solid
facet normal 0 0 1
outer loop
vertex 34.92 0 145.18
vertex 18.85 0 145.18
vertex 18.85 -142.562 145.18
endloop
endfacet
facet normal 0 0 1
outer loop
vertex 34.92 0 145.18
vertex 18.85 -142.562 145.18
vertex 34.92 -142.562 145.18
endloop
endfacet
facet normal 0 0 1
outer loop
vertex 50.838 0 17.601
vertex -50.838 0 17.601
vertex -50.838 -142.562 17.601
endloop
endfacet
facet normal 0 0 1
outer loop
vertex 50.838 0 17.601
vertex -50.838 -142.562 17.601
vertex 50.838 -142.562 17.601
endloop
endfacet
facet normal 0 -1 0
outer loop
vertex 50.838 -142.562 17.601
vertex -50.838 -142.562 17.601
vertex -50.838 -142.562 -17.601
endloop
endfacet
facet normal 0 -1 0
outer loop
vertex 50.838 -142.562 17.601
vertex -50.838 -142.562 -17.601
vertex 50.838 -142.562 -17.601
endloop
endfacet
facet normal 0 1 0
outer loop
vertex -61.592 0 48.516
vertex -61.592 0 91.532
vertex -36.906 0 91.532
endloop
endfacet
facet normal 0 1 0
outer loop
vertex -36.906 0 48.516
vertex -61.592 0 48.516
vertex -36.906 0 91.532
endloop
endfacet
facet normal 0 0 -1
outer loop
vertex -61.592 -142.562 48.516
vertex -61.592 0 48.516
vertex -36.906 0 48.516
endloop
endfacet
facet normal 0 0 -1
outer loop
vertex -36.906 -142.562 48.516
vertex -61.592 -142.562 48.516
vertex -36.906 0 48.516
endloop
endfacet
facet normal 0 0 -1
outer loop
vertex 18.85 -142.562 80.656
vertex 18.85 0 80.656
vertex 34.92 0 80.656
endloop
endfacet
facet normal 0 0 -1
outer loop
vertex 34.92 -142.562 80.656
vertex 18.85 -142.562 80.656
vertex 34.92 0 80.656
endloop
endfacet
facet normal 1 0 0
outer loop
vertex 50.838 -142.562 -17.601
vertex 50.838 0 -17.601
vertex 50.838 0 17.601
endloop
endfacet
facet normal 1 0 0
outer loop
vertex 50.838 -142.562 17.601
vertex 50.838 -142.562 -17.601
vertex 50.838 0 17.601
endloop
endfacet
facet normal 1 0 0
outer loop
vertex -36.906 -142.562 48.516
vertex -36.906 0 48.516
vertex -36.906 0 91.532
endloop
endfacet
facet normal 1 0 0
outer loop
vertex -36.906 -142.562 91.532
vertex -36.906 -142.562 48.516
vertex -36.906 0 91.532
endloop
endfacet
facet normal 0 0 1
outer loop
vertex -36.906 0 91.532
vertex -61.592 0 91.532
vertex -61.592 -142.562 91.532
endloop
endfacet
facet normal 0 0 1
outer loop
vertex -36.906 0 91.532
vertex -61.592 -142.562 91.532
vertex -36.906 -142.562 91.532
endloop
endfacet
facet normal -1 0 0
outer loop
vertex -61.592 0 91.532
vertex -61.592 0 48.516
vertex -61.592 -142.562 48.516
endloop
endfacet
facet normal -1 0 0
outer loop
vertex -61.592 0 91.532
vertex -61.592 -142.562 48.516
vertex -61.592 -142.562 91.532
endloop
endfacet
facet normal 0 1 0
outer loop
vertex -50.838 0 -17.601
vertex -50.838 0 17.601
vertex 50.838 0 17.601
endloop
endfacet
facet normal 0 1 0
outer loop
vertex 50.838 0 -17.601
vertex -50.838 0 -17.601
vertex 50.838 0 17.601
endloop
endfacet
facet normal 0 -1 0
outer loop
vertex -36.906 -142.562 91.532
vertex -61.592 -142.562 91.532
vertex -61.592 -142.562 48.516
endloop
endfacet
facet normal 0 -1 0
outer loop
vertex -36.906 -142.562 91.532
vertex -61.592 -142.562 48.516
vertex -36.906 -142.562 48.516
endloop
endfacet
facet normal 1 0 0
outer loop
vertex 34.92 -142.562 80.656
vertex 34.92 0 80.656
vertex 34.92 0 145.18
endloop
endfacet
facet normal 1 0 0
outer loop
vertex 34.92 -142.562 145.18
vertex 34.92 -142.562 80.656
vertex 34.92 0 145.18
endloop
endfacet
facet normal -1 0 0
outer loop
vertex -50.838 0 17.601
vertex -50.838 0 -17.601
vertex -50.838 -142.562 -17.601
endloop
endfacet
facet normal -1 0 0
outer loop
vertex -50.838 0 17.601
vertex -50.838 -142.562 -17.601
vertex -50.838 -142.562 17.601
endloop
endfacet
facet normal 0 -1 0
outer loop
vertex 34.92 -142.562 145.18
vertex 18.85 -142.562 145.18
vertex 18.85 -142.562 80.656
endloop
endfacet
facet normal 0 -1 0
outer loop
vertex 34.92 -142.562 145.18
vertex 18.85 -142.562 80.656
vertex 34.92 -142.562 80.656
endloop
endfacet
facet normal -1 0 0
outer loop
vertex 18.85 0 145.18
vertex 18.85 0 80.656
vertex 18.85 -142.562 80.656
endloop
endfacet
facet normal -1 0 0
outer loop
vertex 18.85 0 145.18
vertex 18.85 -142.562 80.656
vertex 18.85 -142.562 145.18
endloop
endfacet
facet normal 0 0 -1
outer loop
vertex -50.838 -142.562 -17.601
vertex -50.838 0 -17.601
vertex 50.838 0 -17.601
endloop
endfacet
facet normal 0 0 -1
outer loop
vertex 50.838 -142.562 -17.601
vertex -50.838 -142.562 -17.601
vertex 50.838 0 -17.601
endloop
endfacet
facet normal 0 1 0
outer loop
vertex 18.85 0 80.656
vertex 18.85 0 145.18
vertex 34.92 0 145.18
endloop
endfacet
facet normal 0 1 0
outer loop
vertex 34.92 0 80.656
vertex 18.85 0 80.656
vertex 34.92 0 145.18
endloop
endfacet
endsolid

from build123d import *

# Parameters (mm, degrees)
F0_W     = 16.06986
F0_H     = 64.524651
F0_W_2   = 24.685576
F0_H_2   = 43.016464
F0_W_3   = 101.675228
F0_H_3   = 35.202772
F1_DEPTH = 142.562391


with BuildPart() as f1:
    # F0 (on Front) → F1 (new body)
    with BuildSketch(Plane.XZ):
        with Locations((26.885286, 112.918168)):
            Rectangle(F0_W, F0_H)
        with Locations((-49.248934, 70.023924)):
            Rectangle(F0_W_2, F0_H_2)
        Rectangle(F0_W_3, F0_H_3)
    extrude(amount=F1_DEPTH)


solid = f1.part
